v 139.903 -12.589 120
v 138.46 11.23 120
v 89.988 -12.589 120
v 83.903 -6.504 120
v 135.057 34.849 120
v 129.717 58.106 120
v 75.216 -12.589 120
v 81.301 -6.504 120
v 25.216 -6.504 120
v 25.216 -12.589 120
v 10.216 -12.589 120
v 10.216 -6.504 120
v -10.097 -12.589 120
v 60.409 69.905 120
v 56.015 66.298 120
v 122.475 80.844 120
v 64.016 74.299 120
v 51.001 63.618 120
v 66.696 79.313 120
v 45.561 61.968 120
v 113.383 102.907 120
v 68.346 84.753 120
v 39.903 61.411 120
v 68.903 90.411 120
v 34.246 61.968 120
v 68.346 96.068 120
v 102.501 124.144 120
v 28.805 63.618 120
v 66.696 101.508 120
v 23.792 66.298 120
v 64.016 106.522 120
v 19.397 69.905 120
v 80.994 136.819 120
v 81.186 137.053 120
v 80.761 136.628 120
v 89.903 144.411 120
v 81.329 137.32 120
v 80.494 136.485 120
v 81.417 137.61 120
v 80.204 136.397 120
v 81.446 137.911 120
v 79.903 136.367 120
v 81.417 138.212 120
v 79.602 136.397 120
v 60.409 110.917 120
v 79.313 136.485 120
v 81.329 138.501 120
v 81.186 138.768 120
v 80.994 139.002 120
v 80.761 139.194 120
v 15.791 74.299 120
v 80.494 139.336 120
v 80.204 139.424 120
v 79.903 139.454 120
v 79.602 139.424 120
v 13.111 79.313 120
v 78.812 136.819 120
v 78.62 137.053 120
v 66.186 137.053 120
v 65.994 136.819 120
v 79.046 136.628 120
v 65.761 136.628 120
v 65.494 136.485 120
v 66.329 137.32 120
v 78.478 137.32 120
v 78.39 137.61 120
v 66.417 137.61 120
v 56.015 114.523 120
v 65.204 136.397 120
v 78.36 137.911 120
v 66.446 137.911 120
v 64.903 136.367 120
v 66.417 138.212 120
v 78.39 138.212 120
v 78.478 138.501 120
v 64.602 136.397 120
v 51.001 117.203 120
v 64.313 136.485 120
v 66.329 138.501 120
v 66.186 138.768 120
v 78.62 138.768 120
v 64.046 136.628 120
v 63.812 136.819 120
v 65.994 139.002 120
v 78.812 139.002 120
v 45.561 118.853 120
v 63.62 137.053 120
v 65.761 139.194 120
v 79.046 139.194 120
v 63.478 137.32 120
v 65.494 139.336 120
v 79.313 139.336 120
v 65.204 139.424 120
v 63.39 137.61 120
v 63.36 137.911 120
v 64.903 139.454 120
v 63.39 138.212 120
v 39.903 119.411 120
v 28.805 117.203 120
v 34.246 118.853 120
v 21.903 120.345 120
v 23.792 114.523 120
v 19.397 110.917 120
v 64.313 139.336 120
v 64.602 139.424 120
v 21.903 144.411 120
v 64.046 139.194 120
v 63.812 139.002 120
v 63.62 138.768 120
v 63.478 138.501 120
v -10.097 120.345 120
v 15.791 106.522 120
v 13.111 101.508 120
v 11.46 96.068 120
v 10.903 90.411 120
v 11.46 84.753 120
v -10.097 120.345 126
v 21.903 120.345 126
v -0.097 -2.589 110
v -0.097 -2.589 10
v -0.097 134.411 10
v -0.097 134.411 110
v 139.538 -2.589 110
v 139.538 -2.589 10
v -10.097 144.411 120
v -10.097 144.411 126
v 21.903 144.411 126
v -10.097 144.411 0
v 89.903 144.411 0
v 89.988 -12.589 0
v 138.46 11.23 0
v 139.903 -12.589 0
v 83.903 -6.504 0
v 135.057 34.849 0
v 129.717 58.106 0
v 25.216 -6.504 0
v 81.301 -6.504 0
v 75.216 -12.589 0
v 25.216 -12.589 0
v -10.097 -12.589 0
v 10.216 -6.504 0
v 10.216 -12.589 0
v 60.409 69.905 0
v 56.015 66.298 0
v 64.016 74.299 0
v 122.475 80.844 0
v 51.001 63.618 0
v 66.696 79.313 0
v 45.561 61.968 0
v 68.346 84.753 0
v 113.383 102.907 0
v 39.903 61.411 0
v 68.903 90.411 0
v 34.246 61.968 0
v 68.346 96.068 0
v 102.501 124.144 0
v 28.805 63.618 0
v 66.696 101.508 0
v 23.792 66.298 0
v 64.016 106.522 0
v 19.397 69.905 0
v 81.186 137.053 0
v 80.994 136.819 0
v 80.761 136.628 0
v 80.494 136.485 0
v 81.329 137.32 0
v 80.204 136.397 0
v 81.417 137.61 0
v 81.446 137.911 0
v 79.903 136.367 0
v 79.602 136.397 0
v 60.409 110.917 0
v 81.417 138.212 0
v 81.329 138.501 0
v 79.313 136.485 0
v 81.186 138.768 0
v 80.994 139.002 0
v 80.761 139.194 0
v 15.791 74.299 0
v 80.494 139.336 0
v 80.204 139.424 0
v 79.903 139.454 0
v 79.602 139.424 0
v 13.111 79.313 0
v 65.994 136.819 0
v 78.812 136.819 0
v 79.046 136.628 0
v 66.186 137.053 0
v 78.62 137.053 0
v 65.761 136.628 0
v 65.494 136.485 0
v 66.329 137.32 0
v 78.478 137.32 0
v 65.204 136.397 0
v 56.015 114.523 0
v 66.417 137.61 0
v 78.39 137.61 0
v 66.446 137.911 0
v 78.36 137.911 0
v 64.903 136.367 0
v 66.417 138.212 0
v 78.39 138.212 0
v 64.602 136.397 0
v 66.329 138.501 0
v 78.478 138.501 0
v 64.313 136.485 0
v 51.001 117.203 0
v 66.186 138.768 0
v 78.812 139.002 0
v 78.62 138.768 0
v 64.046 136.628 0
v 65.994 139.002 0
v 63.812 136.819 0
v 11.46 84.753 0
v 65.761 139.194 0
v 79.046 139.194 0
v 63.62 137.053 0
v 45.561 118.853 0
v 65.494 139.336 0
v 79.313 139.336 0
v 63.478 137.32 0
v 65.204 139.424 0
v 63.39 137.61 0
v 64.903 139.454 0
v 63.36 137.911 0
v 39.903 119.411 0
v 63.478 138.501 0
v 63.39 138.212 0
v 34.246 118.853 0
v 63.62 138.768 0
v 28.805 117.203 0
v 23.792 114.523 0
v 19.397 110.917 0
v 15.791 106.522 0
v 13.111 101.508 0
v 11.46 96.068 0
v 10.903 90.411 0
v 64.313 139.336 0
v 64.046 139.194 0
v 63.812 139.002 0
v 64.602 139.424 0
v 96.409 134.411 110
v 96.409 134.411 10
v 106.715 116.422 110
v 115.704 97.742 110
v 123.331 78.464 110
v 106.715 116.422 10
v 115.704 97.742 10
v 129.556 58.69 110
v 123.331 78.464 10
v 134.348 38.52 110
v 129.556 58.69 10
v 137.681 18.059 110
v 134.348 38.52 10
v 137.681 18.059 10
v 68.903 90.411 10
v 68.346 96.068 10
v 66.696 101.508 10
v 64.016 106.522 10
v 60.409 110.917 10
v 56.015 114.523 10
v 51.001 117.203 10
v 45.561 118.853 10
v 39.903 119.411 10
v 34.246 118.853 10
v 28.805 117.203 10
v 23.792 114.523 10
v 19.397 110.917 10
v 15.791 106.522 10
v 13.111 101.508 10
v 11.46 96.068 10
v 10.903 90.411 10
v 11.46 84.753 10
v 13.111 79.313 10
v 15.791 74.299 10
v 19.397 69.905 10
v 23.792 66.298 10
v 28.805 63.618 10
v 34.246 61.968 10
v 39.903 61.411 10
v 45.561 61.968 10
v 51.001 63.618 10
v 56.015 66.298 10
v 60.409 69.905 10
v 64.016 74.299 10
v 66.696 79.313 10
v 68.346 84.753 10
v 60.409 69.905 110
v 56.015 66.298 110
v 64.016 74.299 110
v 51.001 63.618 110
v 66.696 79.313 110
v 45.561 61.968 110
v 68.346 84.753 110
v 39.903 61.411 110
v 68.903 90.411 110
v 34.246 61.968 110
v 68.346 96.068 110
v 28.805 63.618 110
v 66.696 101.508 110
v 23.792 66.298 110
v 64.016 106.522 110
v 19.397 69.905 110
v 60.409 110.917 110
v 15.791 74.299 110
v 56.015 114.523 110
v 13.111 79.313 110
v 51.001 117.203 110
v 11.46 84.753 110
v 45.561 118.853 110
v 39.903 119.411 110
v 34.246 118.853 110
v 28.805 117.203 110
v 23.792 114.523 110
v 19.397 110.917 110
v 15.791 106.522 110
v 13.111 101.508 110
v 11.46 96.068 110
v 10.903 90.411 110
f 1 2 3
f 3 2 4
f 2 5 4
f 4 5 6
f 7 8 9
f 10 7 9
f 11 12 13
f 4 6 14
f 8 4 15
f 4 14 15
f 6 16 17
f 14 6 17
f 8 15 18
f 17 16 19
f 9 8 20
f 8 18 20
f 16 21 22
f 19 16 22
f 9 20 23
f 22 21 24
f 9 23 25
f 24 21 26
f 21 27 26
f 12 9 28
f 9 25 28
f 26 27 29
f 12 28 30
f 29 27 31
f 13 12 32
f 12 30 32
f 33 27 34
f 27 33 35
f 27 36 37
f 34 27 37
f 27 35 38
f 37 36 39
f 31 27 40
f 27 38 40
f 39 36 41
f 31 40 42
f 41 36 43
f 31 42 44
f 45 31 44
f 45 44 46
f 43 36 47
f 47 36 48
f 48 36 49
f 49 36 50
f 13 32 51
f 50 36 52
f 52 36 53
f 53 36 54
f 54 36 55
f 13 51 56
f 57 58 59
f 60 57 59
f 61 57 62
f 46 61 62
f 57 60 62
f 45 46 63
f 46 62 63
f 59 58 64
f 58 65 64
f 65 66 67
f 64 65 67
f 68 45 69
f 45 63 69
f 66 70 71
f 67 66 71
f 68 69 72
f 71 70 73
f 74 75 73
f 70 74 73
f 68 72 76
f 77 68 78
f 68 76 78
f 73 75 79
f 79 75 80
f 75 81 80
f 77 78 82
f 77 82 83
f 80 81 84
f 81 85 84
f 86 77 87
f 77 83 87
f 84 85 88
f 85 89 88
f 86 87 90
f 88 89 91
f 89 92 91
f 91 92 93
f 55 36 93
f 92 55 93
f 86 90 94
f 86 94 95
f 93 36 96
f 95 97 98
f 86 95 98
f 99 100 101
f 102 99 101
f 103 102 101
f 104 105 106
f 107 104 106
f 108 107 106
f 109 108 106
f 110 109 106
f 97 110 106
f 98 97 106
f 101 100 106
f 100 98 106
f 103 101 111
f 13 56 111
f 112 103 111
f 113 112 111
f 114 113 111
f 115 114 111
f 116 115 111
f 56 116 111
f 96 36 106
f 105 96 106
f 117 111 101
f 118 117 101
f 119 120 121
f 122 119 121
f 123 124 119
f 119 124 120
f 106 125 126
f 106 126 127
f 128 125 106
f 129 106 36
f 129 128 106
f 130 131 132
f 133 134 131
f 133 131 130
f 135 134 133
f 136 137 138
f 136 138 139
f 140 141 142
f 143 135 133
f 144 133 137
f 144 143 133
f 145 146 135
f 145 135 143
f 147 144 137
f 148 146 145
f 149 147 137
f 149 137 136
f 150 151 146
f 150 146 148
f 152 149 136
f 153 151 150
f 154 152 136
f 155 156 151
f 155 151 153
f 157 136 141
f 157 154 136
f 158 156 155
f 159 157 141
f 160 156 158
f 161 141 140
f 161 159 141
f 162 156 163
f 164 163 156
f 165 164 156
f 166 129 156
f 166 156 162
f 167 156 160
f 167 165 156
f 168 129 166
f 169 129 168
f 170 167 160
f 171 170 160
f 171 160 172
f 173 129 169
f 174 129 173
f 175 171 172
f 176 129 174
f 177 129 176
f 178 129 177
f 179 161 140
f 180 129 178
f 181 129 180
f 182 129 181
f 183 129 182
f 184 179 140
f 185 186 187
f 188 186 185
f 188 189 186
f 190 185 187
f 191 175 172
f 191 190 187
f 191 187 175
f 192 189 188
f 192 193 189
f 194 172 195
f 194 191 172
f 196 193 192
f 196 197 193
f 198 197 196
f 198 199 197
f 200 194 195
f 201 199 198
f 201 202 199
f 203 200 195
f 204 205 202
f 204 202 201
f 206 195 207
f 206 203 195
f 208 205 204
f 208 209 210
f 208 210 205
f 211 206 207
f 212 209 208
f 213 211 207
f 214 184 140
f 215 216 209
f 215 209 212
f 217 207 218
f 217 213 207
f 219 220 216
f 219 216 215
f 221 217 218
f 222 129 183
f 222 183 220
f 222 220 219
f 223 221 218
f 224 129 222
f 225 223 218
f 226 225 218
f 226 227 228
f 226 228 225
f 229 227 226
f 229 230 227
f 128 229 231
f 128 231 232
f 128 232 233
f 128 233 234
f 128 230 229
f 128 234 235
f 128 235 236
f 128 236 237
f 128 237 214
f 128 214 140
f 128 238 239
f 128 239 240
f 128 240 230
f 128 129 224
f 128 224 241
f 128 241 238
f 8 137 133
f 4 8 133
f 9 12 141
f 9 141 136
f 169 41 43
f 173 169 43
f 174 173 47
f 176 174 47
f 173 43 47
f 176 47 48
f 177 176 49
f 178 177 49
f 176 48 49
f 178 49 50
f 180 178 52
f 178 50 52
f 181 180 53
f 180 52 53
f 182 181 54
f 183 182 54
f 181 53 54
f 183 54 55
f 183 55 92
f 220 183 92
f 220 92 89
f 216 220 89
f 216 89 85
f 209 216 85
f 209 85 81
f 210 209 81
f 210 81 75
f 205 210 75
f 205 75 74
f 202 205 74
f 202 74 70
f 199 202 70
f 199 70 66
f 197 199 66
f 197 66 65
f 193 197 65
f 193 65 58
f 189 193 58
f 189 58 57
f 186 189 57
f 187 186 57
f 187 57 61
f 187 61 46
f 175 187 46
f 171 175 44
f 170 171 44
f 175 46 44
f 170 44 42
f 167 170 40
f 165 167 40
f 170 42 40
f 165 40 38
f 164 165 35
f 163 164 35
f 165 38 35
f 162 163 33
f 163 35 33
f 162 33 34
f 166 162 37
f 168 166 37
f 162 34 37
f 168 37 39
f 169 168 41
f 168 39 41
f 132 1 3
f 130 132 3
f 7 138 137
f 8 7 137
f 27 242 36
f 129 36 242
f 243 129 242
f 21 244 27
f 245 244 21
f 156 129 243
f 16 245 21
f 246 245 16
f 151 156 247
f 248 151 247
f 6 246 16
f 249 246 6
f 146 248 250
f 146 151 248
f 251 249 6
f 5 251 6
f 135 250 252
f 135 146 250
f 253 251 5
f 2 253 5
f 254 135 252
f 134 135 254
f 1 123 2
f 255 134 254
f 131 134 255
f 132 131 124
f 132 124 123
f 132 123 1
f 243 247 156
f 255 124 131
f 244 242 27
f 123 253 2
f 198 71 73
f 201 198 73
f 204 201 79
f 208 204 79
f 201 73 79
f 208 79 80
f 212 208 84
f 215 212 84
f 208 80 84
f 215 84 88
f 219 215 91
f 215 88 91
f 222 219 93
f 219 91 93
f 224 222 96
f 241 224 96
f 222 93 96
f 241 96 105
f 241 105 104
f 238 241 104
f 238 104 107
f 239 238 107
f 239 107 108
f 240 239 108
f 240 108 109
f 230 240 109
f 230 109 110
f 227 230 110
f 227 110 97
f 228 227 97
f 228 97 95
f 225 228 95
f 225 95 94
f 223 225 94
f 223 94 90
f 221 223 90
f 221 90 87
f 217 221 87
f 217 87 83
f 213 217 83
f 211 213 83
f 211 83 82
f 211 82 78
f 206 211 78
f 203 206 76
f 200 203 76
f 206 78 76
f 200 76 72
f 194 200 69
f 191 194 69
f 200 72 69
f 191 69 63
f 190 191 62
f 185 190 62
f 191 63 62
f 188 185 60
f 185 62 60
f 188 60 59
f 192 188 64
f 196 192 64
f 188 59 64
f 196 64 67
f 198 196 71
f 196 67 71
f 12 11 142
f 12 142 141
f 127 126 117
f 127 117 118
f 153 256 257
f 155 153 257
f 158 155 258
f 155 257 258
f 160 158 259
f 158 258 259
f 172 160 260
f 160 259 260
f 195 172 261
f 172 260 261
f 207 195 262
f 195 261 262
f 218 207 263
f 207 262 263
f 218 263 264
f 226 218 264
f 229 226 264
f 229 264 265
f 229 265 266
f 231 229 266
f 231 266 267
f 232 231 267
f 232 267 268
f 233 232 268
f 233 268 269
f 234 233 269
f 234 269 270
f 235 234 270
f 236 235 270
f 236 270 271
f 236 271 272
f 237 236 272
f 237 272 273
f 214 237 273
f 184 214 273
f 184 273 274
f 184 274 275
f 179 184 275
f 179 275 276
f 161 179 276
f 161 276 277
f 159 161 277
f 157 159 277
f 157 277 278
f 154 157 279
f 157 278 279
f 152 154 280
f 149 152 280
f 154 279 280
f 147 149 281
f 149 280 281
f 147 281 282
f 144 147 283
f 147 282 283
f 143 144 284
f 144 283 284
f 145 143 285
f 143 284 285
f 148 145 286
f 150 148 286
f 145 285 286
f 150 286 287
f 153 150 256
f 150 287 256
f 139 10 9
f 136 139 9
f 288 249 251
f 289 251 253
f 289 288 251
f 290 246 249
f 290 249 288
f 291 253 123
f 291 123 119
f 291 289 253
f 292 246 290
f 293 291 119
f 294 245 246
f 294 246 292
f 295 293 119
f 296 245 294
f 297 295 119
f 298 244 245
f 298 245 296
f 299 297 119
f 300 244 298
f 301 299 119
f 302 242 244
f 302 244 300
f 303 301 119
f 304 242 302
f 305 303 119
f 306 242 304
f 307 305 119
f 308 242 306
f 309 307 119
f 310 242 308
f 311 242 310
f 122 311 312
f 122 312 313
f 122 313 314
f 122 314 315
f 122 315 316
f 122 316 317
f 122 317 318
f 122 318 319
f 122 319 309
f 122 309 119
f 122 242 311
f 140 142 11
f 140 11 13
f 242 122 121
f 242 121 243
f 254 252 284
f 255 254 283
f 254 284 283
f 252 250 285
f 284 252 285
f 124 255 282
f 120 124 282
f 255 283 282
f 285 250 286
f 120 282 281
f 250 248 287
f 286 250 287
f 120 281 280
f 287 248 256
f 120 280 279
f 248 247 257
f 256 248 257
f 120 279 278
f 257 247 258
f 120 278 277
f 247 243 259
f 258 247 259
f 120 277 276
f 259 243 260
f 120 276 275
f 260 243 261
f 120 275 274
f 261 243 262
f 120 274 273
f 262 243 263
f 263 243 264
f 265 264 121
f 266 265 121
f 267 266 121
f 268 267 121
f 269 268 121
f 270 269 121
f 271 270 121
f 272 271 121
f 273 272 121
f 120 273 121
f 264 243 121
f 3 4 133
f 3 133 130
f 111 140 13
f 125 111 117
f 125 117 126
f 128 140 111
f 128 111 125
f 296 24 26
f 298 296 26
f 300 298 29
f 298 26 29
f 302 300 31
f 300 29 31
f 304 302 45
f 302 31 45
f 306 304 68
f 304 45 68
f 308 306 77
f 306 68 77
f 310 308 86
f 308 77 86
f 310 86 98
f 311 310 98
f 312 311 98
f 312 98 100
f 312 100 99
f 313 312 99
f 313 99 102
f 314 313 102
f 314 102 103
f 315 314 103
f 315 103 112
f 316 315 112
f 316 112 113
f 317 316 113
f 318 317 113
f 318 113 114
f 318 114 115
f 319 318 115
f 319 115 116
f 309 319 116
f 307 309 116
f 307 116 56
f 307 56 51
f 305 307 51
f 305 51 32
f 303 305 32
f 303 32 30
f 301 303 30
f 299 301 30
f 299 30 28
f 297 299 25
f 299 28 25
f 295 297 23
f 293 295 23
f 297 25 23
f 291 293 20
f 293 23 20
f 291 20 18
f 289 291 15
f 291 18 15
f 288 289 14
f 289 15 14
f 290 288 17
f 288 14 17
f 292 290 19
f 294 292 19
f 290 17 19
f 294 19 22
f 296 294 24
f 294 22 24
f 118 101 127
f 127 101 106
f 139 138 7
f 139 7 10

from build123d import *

# Parameters (mm, degrees)
BOSS_EXTRUDE1_DEPTH = 120
SHELL1_T            = -10
SKETCH2_R           = 29
SKETCH2_R_2         = 1.54318701
CUT_EXTRUDE1_DEPTH  = 200
SKETCH3_W           = 15
SKETCH3_H           = 6.085201518
CUT_EXTRUDE2_DEPTH  = 200
SKETCH4_W           = 32
SKETCH4_H           = 24.066005235
BOSS_EXTRUDE2_DEPTH = 6


with BuildPart() as part:
    # Sketch1 → Boss-Extrude1 (new body)
    with BuildSketch(Plane.XY):
        with BuildLine():
            Line((-10.096774194, 144.410679099), (89.903225806, 144.410679099))
            ThreePointArc((89.903225806, 144.410679099), (126.330854691, 69.550051356), (139.903225806, -12.589320901))
            Line((139.903225806, -12.589320901), (-10.096774194, -12.589320901))
            Line((-10.096774194, -12.589320901), (-10.096774194, 144.410679099))
        make_face()
    extrude(amount=BOSS_EXTRUDE1_DEPTH)

    # Shell1
    shell1_openings = [part.faces().sort_by_distance(p)[0] for p in [
        (120.617040249, 67.730365228, 60),
    ]]
    offset(amount=SHELL1_T, openings=shell1_openings, kind=Kind.INTERSECTION)

    # Sketch2 → Cut-Extrude1 (cut)
    with BuildSketch(Plane.XY.offset(120)):
        with Locations((39.903225806, 90.410679099)):
            Circle(SKETCH2_R)
        with Locations((79.903225806, 137.910679099)):
            Circle(SKETCH2_R_2)
        with Locations((64.903225806, 137.910679099)):
            Circle(SKETCH2_R_2)
    extrude(amount=-CUT_EXTRUDE1_DEPTH, mode=Mode.SUBTRACT)

    # Sketch3 → Cut-Extrude2 (cut)
    with BuildSketch(Plane.XY.offset(120)):
        Polygon((75.215541826, -12.589320901), (81.300743344, -6.504119383), (83.903225806, -6.504119383), (89.988427324, -12.589320901), align=None)
        with Locations((17.715541826, -9.546720142)):
            Rectangle(SKETCH3_W, SKETCH3_H)
    extrude(amount=-CUT_EXTRUDE2_DEPTH, mode=Mode.SUBTRACT)

    # Sketch4 → Boss-Extrude2 (add)
    with BuildSketch(Plane.XY.offset(120)):
        with Locations((5.903225806, 132.377676482)):
            Rectangle(SKETCH4_W, SKETCH4_H)
    extrude(amount=BOSS_EXTRUDE2_DEPTH)


solid = part.part
